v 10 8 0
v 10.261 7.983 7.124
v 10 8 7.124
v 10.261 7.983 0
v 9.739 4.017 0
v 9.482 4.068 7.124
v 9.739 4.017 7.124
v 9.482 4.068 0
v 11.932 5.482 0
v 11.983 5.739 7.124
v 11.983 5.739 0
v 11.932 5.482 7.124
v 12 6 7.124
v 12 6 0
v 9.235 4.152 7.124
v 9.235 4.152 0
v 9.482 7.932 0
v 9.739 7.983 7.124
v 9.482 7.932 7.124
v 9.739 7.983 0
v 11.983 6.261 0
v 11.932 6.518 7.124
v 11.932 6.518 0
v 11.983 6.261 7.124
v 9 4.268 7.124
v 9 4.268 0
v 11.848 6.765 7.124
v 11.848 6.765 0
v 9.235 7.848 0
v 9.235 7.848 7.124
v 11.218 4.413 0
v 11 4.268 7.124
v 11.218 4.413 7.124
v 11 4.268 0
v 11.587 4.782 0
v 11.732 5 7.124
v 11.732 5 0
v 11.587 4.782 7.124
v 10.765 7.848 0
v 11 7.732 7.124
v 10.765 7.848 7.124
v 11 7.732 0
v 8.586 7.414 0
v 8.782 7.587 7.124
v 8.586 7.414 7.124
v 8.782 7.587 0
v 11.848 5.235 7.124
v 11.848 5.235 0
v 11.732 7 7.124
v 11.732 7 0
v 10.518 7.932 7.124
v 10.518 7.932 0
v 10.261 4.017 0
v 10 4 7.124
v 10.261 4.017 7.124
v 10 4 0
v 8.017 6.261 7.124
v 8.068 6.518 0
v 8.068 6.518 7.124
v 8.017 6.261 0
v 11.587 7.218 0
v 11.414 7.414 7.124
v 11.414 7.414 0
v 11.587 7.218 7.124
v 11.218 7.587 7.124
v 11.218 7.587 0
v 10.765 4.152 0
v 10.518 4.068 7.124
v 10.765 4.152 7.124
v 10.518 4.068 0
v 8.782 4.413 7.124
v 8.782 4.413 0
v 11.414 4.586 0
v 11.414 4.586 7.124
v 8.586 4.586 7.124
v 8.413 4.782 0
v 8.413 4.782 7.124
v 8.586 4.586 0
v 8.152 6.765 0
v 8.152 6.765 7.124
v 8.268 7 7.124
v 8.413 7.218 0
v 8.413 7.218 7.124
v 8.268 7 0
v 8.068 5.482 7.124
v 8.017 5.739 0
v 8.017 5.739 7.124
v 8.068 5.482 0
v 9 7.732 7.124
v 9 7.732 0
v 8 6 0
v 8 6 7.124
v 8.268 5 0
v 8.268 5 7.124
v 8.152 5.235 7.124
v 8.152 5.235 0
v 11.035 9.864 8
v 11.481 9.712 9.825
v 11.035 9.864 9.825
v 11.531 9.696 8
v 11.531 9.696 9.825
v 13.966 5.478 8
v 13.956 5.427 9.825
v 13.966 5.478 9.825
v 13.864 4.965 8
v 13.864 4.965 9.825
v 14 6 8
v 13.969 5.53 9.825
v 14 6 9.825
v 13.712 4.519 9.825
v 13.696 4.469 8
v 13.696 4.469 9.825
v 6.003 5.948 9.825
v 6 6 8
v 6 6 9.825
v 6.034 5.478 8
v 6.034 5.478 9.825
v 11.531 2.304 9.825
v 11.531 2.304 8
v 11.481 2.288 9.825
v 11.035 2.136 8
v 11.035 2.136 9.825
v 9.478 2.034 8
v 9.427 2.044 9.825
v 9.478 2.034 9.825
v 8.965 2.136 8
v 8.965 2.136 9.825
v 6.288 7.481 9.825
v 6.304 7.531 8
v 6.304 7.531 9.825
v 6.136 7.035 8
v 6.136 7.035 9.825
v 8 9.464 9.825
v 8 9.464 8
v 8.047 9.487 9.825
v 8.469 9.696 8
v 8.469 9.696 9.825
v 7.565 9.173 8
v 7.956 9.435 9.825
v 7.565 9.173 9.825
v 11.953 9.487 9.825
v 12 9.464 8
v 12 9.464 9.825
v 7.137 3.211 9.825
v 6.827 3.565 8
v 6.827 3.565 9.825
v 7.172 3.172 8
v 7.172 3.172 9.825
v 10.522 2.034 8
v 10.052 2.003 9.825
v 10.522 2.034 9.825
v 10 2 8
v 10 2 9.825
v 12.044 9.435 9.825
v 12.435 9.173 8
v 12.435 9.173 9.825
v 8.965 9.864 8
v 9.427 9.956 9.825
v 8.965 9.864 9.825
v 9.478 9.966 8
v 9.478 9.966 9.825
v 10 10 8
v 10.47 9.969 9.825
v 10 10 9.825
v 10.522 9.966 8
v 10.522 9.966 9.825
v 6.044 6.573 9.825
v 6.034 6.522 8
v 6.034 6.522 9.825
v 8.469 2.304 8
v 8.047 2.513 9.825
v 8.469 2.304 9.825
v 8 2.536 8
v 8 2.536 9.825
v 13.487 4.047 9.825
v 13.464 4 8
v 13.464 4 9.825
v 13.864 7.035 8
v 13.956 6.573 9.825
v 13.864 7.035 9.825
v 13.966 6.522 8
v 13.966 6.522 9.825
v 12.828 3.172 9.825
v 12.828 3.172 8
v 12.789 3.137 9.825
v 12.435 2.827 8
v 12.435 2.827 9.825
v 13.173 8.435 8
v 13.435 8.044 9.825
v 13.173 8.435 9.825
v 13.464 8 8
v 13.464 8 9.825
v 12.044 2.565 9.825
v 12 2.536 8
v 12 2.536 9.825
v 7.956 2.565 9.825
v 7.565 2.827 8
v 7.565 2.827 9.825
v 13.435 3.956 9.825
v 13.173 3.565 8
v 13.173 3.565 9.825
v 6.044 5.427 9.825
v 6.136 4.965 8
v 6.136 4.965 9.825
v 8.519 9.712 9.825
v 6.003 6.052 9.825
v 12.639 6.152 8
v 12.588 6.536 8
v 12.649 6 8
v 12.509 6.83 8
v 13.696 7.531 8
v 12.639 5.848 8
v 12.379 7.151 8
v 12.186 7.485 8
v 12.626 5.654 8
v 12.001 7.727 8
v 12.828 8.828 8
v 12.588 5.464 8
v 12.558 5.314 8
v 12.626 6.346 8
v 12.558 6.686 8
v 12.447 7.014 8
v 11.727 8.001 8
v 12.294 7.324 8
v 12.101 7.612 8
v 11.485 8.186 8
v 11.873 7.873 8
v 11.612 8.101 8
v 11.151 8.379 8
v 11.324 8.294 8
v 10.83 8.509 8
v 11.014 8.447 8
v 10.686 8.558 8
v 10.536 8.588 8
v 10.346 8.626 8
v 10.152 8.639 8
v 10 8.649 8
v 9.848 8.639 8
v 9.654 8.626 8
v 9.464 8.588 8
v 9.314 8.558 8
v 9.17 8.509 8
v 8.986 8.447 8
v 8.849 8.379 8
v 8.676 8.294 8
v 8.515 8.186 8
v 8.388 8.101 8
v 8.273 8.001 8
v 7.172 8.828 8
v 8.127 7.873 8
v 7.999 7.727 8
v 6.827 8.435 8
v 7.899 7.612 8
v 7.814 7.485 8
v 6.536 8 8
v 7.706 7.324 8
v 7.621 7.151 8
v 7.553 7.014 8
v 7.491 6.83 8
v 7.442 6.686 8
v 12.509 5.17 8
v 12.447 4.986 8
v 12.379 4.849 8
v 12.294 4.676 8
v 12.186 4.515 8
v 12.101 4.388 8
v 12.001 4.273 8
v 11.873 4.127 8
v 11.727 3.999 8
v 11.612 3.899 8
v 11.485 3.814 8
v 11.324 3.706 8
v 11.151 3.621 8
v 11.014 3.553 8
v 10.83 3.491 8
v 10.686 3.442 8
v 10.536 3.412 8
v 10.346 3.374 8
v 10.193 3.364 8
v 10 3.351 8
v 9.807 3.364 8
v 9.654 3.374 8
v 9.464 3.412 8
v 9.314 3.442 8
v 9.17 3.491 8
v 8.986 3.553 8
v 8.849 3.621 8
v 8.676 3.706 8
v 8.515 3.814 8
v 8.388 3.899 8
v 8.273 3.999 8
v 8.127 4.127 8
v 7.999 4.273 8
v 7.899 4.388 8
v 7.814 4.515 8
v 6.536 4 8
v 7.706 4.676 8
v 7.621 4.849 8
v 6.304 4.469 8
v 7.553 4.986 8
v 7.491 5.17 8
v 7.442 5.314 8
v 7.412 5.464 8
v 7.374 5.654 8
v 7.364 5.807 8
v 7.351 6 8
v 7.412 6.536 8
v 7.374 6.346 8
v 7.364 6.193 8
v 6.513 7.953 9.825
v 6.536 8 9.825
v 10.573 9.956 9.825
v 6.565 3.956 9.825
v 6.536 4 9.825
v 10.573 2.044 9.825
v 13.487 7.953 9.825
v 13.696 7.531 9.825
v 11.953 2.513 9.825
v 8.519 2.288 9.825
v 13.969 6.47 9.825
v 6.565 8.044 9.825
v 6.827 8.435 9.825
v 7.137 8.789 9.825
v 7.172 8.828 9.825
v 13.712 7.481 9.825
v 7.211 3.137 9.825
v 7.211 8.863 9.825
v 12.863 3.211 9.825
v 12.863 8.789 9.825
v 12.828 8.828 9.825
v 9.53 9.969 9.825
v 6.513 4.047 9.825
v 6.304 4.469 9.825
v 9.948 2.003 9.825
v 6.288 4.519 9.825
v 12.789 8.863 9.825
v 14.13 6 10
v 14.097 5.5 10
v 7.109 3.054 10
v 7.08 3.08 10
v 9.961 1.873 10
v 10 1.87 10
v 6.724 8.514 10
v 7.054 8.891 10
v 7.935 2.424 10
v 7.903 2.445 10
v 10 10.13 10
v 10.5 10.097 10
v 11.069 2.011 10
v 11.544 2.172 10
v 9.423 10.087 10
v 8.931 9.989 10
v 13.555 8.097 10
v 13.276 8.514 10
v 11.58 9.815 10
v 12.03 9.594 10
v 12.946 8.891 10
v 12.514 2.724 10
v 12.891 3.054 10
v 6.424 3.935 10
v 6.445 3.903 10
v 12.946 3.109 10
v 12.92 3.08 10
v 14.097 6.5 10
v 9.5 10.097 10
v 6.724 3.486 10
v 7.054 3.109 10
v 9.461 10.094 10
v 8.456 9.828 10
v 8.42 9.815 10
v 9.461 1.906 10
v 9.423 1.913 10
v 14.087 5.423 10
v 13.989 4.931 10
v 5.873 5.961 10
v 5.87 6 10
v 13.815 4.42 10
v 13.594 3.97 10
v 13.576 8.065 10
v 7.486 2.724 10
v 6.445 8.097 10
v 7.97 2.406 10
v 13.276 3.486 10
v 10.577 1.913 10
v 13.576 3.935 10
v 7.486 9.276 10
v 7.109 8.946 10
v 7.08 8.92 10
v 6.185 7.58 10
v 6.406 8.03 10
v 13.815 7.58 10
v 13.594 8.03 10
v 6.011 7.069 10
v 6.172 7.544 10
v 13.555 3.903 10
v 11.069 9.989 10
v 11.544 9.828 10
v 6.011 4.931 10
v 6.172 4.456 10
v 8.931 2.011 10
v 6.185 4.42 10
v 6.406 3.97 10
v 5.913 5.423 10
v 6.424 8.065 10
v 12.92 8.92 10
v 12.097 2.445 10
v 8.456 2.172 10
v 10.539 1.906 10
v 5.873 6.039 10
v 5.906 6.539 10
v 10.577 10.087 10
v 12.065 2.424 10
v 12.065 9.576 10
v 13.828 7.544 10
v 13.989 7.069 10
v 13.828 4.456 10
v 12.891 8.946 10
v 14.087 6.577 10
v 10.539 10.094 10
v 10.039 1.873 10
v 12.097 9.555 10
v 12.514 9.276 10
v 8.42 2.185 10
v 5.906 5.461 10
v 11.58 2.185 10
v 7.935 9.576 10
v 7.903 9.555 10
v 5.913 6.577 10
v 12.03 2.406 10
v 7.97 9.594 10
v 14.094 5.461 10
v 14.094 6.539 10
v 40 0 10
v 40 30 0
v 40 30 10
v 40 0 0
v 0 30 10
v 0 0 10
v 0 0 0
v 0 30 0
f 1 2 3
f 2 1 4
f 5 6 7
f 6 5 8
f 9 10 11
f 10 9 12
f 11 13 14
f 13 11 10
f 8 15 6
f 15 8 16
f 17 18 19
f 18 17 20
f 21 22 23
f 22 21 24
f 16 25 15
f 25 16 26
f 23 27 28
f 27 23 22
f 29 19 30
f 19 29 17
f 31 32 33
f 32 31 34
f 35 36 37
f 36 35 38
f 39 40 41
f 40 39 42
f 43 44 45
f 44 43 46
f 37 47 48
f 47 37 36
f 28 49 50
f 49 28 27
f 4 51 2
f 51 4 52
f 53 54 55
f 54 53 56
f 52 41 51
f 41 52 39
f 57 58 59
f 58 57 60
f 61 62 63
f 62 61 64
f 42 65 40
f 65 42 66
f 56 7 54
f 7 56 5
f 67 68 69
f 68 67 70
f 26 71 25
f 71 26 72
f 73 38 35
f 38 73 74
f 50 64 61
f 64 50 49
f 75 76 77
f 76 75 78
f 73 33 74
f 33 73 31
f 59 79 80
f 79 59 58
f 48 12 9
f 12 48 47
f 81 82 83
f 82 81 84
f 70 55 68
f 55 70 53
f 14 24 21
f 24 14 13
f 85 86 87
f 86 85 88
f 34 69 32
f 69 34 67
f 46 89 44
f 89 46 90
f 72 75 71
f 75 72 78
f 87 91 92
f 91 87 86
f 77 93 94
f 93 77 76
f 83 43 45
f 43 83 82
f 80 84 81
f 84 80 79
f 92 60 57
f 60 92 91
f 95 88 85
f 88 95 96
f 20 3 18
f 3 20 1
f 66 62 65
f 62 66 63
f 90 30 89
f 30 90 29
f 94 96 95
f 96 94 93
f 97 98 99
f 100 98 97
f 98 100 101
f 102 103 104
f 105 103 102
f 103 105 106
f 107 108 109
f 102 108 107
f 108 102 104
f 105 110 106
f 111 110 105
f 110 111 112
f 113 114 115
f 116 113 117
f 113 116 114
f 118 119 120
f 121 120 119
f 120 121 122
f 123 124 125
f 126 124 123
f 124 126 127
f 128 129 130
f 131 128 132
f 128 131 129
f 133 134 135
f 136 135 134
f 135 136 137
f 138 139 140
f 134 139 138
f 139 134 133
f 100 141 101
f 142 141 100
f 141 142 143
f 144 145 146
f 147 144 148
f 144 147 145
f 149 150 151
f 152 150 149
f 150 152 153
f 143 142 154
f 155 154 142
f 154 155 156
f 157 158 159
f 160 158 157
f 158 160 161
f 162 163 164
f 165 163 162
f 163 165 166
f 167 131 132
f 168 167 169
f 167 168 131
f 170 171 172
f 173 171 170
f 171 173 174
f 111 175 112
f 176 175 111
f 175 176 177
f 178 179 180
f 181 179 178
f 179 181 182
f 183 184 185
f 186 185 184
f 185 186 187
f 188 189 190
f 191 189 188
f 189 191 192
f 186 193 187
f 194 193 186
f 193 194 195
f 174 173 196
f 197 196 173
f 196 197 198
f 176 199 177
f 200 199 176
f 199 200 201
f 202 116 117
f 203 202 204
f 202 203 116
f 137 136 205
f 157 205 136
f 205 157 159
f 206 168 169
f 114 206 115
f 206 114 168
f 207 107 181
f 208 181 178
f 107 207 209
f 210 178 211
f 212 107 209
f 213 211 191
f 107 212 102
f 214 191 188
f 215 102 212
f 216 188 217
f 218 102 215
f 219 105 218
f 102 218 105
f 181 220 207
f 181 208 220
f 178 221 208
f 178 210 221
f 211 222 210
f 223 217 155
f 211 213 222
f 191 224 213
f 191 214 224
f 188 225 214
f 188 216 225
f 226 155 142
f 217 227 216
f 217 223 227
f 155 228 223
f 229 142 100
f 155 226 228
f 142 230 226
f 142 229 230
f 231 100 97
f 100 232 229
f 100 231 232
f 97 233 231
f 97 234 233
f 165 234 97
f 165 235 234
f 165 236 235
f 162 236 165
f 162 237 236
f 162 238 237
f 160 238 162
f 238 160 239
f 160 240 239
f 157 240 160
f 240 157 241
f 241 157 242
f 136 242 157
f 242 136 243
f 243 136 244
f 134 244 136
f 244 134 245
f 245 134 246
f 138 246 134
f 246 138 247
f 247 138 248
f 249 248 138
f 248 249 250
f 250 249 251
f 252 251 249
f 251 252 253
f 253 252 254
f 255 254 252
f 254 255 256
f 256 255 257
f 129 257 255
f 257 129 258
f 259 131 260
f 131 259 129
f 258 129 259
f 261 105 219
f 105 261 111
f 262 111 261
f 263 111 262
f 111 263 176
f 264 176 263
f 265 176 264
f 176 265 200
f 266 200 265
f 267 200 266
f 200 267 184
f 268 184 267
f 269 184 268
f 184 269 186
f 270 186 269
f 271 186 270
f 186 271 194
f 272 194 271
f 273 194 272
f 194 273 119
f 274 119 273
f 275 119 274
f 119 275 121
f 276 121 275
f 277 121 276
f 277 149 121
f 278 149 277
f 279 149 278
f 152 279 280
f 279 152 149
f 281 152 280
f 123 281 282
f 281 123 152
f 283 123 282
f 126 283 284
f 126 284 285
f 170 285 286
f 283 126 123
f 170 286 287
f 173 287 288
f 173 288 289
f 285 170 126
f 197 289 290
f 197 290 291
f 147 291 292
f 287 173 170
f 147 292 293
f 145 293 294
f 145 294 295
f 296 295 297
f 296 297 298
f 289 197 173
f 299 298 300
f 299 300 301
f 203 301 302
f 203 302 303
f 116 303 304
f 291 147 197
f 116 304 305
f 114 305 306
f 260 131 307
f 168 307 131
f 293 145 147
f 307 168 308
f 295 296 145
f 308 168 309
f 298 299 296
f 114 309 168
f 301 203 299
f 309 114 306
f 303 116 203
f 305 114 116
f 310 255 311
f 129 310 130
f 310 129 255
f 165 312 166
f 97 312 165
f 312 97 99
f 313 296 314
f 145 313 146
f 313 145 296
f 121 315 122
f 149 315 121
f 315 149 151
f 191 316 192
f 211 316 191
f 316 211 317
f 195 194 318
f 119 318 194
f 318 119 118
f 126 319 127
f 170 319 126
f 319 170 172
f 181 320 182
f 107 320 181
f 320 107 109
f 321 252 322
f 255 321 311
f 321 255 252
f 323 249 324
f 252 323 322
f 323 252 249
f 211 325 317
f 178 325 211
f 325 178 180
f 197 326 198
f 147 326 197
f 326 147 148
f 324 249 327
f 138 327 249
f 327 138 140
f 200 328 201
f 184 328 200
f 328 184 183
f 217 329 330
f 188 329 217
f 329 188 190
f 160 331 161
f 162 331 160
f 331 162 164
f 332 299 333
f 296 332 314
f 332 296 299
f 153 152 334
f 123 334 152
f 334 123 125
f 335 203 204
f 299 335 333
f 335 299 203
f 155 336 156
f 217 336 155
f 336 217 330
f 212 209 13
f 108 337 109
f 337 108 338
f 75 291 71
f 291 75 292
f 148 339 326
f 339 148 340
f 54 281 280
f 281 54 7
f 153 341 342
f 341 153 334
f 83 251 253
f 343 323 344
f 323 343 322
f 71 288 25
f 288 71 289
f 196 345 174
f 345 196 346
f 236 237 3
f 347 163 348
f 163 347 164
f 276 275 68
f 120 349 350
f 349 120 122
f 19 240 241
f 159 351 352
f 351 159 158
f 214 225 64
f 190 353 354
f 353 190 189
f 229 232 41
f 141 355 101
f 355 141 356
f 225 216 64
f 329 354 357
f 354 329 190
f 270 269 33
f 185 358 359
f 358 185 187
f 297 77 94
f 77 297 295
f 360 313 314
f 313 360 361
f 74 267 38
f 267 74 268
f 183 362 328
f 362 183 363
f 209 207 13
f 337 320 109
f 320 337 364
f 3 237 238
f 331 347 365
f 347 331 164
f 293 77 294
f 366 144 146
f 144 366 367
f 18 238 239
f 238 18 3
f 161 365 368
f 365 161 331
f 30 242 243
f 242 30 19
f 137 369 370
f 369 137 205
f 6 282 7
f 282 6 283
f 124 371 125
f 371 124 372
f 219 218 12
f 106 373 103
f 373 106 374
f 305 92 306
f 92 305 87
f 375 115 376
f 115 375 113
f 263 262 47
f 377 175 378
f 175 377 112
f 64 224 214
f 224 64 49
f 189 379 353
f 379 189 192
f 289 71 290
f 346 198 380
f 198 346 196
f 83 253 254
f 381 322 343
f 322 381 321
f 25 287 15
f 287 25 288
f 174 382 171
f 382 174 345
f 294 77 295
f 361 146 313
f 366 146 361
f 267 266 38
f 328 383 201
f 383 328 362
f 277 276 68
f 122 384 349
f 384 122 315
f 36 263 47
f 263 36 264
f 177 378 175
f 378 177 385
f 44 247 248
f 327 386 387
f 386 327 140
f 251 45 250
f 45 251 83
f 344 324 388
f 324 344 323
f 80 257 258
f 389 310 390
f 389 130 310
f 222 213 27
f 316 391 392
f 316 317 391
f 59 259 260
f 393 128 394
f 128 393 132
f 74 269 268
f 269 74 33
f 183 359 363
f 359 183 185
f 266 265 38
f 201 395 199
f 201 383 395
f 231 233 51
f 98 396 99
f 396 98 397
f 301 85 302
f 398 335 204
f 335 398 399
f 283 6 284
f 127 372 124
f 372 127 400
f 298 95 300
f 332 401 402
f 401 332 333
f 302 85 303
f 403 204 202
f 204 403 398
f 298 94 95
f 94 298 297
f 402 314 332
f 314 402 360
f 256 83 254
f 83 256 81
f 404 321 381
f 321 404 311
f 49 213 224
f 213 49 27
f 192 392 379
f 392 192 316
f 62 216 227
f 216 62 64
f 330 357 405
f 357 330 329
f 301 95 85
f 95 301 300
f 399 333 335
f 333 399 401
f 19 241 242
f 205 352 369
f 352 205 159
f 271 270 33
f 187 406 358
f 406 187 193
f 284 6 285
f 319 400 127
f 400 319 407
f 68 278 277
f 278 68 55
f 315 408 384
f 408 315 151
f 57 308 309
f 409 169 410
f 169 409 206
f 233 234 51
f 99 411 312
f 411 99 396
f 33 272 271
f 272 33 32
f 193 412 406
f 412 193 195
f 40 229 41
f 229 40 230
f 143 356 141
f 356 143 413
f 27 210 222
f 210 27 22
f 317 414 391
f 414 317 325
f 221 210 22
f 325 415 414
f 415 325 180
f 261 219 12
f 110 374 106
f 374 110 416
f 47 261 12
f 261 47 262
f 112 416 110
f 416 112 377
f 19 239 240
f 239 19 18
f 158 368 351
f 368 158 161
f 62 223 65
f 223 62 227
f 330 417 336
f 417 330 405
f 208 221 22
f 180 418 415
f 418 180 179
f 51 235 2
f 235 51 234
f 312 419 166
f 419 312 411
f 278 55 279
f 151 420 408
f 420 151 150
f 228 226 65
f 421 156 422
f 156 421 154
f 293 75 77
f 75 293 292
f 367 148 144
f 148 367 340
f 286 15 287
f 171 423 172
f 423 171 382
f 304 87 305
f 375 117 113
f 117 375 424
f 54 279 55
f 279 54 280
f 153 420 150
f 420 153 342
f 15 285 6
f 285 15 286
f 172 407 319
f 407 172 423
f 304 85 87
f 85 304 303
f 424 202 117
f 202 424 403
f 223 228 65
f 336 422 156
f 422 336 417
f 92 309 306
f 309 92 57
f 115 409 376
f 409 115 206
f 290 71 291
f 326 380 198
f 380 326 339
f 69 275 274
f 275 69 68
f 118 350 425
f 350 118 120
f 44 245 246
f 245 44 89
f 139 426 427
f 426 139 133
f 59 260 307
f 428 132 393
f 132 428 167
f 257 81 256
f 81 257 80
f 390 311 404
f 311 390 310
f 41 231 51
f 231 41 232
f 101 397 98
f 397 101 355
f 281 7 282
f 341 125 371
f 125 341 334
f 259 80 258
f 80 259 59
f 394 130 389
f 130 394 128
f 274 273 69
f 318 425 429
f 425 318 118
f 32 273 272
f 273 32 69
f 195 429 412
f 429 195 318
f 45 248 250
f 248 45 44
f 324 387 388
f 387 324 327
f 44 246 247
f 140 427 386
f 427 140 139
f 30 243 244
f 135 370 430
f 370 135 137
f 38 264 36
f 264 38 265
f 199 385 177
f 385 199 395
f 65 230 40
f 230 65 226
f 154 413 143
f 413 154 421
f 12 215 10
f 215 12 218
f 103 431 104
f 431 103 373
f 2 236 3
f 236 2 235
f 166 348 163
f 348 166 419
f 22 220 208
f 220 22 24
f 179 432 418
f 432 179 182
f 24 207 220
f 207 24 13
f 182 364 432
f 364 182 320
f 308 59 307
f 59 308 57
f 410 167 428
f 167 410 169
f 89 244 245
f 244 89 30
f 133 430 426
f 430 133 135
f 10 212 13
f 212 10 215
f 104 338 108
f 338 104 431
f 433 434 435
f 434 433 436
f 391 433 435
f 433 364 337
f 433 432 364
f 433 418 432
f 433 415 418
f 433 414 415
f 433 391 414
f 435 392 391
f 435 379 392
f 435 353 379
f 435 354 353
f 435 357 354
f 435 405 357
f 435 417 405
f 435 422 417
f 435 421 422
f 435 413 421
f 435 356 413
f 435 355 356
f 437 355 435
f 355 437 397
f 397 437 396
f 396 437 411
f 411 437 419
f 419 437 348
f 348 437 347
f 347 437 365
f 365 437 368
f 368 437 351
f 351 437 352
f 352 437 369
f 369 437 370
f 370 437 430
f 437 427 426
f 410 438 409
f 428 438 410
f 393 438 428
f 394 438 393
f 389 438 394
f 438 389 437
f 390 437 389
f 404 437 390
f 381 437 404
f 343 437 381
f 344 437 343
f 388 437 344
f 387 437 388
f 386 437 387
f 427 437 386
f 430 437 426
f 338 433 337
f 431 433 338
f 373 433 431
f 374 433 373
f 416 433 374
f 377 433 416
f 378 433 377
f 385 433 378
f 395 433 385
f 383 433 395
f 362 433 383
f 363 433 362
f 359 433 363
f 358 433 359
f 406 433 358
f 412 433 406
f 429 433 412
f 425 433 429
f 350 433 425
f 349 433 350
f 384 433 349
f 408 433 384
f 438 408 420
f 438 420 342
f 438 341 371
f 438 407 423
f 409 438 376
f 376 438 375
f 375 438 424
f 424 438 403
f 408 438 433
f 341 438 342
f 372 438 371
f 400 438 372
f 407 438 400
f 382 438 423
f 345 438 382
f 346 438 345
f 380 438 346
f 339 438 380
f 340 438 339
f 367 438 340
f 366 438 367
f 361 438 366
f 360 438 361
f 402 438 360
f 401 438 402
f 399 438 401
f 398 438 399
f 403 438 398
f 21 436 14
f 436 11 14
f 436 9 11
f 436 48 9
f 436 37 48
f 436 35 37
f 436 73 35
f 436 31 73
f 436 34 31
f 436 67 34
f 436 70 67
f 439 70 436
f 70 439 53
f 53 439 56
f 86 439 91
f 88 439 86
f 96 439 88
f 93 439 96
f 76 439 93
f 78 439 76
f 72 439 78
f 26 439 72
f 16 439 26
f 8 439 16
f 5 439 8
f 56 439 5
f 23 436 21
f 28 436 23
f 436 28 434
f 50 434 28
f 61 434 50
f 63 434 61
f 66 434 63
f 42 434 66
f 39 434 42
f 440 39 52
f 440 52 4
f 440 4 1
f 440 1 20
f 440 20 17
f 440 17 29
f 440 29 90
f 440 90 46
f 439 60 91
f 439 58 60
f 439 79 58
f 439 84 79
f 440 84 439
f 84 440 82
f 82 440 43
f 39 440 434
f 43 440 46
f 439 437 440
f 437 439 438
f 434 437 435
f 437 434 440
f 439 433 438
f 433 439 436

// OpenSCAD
// units=mm — generated by scad_emitter.py
// part=unnamed
$fn = 48;

difference() { cube([40, 30, 10]); union() { translate([10, 6, 10.5]) rotate([180, 0, 0]) cylinder(h=11, r=2, $fn=$fn); translate([10, 6, 10.5]) rotate([180, 0, 0]) cylinder(h=1, r1=2.5, r2=2, $fn=$fn); translate([10, 6, 10.5]) rotate([180, 0, 0]) cylinder(h=2.5, r=4, $fn=$fn); translate([10, 6, 10.5]) rotate([180, 0, 0]) cylinder(h=3.3759, r1=4.5, r2=2, $fn=$fn); } }
